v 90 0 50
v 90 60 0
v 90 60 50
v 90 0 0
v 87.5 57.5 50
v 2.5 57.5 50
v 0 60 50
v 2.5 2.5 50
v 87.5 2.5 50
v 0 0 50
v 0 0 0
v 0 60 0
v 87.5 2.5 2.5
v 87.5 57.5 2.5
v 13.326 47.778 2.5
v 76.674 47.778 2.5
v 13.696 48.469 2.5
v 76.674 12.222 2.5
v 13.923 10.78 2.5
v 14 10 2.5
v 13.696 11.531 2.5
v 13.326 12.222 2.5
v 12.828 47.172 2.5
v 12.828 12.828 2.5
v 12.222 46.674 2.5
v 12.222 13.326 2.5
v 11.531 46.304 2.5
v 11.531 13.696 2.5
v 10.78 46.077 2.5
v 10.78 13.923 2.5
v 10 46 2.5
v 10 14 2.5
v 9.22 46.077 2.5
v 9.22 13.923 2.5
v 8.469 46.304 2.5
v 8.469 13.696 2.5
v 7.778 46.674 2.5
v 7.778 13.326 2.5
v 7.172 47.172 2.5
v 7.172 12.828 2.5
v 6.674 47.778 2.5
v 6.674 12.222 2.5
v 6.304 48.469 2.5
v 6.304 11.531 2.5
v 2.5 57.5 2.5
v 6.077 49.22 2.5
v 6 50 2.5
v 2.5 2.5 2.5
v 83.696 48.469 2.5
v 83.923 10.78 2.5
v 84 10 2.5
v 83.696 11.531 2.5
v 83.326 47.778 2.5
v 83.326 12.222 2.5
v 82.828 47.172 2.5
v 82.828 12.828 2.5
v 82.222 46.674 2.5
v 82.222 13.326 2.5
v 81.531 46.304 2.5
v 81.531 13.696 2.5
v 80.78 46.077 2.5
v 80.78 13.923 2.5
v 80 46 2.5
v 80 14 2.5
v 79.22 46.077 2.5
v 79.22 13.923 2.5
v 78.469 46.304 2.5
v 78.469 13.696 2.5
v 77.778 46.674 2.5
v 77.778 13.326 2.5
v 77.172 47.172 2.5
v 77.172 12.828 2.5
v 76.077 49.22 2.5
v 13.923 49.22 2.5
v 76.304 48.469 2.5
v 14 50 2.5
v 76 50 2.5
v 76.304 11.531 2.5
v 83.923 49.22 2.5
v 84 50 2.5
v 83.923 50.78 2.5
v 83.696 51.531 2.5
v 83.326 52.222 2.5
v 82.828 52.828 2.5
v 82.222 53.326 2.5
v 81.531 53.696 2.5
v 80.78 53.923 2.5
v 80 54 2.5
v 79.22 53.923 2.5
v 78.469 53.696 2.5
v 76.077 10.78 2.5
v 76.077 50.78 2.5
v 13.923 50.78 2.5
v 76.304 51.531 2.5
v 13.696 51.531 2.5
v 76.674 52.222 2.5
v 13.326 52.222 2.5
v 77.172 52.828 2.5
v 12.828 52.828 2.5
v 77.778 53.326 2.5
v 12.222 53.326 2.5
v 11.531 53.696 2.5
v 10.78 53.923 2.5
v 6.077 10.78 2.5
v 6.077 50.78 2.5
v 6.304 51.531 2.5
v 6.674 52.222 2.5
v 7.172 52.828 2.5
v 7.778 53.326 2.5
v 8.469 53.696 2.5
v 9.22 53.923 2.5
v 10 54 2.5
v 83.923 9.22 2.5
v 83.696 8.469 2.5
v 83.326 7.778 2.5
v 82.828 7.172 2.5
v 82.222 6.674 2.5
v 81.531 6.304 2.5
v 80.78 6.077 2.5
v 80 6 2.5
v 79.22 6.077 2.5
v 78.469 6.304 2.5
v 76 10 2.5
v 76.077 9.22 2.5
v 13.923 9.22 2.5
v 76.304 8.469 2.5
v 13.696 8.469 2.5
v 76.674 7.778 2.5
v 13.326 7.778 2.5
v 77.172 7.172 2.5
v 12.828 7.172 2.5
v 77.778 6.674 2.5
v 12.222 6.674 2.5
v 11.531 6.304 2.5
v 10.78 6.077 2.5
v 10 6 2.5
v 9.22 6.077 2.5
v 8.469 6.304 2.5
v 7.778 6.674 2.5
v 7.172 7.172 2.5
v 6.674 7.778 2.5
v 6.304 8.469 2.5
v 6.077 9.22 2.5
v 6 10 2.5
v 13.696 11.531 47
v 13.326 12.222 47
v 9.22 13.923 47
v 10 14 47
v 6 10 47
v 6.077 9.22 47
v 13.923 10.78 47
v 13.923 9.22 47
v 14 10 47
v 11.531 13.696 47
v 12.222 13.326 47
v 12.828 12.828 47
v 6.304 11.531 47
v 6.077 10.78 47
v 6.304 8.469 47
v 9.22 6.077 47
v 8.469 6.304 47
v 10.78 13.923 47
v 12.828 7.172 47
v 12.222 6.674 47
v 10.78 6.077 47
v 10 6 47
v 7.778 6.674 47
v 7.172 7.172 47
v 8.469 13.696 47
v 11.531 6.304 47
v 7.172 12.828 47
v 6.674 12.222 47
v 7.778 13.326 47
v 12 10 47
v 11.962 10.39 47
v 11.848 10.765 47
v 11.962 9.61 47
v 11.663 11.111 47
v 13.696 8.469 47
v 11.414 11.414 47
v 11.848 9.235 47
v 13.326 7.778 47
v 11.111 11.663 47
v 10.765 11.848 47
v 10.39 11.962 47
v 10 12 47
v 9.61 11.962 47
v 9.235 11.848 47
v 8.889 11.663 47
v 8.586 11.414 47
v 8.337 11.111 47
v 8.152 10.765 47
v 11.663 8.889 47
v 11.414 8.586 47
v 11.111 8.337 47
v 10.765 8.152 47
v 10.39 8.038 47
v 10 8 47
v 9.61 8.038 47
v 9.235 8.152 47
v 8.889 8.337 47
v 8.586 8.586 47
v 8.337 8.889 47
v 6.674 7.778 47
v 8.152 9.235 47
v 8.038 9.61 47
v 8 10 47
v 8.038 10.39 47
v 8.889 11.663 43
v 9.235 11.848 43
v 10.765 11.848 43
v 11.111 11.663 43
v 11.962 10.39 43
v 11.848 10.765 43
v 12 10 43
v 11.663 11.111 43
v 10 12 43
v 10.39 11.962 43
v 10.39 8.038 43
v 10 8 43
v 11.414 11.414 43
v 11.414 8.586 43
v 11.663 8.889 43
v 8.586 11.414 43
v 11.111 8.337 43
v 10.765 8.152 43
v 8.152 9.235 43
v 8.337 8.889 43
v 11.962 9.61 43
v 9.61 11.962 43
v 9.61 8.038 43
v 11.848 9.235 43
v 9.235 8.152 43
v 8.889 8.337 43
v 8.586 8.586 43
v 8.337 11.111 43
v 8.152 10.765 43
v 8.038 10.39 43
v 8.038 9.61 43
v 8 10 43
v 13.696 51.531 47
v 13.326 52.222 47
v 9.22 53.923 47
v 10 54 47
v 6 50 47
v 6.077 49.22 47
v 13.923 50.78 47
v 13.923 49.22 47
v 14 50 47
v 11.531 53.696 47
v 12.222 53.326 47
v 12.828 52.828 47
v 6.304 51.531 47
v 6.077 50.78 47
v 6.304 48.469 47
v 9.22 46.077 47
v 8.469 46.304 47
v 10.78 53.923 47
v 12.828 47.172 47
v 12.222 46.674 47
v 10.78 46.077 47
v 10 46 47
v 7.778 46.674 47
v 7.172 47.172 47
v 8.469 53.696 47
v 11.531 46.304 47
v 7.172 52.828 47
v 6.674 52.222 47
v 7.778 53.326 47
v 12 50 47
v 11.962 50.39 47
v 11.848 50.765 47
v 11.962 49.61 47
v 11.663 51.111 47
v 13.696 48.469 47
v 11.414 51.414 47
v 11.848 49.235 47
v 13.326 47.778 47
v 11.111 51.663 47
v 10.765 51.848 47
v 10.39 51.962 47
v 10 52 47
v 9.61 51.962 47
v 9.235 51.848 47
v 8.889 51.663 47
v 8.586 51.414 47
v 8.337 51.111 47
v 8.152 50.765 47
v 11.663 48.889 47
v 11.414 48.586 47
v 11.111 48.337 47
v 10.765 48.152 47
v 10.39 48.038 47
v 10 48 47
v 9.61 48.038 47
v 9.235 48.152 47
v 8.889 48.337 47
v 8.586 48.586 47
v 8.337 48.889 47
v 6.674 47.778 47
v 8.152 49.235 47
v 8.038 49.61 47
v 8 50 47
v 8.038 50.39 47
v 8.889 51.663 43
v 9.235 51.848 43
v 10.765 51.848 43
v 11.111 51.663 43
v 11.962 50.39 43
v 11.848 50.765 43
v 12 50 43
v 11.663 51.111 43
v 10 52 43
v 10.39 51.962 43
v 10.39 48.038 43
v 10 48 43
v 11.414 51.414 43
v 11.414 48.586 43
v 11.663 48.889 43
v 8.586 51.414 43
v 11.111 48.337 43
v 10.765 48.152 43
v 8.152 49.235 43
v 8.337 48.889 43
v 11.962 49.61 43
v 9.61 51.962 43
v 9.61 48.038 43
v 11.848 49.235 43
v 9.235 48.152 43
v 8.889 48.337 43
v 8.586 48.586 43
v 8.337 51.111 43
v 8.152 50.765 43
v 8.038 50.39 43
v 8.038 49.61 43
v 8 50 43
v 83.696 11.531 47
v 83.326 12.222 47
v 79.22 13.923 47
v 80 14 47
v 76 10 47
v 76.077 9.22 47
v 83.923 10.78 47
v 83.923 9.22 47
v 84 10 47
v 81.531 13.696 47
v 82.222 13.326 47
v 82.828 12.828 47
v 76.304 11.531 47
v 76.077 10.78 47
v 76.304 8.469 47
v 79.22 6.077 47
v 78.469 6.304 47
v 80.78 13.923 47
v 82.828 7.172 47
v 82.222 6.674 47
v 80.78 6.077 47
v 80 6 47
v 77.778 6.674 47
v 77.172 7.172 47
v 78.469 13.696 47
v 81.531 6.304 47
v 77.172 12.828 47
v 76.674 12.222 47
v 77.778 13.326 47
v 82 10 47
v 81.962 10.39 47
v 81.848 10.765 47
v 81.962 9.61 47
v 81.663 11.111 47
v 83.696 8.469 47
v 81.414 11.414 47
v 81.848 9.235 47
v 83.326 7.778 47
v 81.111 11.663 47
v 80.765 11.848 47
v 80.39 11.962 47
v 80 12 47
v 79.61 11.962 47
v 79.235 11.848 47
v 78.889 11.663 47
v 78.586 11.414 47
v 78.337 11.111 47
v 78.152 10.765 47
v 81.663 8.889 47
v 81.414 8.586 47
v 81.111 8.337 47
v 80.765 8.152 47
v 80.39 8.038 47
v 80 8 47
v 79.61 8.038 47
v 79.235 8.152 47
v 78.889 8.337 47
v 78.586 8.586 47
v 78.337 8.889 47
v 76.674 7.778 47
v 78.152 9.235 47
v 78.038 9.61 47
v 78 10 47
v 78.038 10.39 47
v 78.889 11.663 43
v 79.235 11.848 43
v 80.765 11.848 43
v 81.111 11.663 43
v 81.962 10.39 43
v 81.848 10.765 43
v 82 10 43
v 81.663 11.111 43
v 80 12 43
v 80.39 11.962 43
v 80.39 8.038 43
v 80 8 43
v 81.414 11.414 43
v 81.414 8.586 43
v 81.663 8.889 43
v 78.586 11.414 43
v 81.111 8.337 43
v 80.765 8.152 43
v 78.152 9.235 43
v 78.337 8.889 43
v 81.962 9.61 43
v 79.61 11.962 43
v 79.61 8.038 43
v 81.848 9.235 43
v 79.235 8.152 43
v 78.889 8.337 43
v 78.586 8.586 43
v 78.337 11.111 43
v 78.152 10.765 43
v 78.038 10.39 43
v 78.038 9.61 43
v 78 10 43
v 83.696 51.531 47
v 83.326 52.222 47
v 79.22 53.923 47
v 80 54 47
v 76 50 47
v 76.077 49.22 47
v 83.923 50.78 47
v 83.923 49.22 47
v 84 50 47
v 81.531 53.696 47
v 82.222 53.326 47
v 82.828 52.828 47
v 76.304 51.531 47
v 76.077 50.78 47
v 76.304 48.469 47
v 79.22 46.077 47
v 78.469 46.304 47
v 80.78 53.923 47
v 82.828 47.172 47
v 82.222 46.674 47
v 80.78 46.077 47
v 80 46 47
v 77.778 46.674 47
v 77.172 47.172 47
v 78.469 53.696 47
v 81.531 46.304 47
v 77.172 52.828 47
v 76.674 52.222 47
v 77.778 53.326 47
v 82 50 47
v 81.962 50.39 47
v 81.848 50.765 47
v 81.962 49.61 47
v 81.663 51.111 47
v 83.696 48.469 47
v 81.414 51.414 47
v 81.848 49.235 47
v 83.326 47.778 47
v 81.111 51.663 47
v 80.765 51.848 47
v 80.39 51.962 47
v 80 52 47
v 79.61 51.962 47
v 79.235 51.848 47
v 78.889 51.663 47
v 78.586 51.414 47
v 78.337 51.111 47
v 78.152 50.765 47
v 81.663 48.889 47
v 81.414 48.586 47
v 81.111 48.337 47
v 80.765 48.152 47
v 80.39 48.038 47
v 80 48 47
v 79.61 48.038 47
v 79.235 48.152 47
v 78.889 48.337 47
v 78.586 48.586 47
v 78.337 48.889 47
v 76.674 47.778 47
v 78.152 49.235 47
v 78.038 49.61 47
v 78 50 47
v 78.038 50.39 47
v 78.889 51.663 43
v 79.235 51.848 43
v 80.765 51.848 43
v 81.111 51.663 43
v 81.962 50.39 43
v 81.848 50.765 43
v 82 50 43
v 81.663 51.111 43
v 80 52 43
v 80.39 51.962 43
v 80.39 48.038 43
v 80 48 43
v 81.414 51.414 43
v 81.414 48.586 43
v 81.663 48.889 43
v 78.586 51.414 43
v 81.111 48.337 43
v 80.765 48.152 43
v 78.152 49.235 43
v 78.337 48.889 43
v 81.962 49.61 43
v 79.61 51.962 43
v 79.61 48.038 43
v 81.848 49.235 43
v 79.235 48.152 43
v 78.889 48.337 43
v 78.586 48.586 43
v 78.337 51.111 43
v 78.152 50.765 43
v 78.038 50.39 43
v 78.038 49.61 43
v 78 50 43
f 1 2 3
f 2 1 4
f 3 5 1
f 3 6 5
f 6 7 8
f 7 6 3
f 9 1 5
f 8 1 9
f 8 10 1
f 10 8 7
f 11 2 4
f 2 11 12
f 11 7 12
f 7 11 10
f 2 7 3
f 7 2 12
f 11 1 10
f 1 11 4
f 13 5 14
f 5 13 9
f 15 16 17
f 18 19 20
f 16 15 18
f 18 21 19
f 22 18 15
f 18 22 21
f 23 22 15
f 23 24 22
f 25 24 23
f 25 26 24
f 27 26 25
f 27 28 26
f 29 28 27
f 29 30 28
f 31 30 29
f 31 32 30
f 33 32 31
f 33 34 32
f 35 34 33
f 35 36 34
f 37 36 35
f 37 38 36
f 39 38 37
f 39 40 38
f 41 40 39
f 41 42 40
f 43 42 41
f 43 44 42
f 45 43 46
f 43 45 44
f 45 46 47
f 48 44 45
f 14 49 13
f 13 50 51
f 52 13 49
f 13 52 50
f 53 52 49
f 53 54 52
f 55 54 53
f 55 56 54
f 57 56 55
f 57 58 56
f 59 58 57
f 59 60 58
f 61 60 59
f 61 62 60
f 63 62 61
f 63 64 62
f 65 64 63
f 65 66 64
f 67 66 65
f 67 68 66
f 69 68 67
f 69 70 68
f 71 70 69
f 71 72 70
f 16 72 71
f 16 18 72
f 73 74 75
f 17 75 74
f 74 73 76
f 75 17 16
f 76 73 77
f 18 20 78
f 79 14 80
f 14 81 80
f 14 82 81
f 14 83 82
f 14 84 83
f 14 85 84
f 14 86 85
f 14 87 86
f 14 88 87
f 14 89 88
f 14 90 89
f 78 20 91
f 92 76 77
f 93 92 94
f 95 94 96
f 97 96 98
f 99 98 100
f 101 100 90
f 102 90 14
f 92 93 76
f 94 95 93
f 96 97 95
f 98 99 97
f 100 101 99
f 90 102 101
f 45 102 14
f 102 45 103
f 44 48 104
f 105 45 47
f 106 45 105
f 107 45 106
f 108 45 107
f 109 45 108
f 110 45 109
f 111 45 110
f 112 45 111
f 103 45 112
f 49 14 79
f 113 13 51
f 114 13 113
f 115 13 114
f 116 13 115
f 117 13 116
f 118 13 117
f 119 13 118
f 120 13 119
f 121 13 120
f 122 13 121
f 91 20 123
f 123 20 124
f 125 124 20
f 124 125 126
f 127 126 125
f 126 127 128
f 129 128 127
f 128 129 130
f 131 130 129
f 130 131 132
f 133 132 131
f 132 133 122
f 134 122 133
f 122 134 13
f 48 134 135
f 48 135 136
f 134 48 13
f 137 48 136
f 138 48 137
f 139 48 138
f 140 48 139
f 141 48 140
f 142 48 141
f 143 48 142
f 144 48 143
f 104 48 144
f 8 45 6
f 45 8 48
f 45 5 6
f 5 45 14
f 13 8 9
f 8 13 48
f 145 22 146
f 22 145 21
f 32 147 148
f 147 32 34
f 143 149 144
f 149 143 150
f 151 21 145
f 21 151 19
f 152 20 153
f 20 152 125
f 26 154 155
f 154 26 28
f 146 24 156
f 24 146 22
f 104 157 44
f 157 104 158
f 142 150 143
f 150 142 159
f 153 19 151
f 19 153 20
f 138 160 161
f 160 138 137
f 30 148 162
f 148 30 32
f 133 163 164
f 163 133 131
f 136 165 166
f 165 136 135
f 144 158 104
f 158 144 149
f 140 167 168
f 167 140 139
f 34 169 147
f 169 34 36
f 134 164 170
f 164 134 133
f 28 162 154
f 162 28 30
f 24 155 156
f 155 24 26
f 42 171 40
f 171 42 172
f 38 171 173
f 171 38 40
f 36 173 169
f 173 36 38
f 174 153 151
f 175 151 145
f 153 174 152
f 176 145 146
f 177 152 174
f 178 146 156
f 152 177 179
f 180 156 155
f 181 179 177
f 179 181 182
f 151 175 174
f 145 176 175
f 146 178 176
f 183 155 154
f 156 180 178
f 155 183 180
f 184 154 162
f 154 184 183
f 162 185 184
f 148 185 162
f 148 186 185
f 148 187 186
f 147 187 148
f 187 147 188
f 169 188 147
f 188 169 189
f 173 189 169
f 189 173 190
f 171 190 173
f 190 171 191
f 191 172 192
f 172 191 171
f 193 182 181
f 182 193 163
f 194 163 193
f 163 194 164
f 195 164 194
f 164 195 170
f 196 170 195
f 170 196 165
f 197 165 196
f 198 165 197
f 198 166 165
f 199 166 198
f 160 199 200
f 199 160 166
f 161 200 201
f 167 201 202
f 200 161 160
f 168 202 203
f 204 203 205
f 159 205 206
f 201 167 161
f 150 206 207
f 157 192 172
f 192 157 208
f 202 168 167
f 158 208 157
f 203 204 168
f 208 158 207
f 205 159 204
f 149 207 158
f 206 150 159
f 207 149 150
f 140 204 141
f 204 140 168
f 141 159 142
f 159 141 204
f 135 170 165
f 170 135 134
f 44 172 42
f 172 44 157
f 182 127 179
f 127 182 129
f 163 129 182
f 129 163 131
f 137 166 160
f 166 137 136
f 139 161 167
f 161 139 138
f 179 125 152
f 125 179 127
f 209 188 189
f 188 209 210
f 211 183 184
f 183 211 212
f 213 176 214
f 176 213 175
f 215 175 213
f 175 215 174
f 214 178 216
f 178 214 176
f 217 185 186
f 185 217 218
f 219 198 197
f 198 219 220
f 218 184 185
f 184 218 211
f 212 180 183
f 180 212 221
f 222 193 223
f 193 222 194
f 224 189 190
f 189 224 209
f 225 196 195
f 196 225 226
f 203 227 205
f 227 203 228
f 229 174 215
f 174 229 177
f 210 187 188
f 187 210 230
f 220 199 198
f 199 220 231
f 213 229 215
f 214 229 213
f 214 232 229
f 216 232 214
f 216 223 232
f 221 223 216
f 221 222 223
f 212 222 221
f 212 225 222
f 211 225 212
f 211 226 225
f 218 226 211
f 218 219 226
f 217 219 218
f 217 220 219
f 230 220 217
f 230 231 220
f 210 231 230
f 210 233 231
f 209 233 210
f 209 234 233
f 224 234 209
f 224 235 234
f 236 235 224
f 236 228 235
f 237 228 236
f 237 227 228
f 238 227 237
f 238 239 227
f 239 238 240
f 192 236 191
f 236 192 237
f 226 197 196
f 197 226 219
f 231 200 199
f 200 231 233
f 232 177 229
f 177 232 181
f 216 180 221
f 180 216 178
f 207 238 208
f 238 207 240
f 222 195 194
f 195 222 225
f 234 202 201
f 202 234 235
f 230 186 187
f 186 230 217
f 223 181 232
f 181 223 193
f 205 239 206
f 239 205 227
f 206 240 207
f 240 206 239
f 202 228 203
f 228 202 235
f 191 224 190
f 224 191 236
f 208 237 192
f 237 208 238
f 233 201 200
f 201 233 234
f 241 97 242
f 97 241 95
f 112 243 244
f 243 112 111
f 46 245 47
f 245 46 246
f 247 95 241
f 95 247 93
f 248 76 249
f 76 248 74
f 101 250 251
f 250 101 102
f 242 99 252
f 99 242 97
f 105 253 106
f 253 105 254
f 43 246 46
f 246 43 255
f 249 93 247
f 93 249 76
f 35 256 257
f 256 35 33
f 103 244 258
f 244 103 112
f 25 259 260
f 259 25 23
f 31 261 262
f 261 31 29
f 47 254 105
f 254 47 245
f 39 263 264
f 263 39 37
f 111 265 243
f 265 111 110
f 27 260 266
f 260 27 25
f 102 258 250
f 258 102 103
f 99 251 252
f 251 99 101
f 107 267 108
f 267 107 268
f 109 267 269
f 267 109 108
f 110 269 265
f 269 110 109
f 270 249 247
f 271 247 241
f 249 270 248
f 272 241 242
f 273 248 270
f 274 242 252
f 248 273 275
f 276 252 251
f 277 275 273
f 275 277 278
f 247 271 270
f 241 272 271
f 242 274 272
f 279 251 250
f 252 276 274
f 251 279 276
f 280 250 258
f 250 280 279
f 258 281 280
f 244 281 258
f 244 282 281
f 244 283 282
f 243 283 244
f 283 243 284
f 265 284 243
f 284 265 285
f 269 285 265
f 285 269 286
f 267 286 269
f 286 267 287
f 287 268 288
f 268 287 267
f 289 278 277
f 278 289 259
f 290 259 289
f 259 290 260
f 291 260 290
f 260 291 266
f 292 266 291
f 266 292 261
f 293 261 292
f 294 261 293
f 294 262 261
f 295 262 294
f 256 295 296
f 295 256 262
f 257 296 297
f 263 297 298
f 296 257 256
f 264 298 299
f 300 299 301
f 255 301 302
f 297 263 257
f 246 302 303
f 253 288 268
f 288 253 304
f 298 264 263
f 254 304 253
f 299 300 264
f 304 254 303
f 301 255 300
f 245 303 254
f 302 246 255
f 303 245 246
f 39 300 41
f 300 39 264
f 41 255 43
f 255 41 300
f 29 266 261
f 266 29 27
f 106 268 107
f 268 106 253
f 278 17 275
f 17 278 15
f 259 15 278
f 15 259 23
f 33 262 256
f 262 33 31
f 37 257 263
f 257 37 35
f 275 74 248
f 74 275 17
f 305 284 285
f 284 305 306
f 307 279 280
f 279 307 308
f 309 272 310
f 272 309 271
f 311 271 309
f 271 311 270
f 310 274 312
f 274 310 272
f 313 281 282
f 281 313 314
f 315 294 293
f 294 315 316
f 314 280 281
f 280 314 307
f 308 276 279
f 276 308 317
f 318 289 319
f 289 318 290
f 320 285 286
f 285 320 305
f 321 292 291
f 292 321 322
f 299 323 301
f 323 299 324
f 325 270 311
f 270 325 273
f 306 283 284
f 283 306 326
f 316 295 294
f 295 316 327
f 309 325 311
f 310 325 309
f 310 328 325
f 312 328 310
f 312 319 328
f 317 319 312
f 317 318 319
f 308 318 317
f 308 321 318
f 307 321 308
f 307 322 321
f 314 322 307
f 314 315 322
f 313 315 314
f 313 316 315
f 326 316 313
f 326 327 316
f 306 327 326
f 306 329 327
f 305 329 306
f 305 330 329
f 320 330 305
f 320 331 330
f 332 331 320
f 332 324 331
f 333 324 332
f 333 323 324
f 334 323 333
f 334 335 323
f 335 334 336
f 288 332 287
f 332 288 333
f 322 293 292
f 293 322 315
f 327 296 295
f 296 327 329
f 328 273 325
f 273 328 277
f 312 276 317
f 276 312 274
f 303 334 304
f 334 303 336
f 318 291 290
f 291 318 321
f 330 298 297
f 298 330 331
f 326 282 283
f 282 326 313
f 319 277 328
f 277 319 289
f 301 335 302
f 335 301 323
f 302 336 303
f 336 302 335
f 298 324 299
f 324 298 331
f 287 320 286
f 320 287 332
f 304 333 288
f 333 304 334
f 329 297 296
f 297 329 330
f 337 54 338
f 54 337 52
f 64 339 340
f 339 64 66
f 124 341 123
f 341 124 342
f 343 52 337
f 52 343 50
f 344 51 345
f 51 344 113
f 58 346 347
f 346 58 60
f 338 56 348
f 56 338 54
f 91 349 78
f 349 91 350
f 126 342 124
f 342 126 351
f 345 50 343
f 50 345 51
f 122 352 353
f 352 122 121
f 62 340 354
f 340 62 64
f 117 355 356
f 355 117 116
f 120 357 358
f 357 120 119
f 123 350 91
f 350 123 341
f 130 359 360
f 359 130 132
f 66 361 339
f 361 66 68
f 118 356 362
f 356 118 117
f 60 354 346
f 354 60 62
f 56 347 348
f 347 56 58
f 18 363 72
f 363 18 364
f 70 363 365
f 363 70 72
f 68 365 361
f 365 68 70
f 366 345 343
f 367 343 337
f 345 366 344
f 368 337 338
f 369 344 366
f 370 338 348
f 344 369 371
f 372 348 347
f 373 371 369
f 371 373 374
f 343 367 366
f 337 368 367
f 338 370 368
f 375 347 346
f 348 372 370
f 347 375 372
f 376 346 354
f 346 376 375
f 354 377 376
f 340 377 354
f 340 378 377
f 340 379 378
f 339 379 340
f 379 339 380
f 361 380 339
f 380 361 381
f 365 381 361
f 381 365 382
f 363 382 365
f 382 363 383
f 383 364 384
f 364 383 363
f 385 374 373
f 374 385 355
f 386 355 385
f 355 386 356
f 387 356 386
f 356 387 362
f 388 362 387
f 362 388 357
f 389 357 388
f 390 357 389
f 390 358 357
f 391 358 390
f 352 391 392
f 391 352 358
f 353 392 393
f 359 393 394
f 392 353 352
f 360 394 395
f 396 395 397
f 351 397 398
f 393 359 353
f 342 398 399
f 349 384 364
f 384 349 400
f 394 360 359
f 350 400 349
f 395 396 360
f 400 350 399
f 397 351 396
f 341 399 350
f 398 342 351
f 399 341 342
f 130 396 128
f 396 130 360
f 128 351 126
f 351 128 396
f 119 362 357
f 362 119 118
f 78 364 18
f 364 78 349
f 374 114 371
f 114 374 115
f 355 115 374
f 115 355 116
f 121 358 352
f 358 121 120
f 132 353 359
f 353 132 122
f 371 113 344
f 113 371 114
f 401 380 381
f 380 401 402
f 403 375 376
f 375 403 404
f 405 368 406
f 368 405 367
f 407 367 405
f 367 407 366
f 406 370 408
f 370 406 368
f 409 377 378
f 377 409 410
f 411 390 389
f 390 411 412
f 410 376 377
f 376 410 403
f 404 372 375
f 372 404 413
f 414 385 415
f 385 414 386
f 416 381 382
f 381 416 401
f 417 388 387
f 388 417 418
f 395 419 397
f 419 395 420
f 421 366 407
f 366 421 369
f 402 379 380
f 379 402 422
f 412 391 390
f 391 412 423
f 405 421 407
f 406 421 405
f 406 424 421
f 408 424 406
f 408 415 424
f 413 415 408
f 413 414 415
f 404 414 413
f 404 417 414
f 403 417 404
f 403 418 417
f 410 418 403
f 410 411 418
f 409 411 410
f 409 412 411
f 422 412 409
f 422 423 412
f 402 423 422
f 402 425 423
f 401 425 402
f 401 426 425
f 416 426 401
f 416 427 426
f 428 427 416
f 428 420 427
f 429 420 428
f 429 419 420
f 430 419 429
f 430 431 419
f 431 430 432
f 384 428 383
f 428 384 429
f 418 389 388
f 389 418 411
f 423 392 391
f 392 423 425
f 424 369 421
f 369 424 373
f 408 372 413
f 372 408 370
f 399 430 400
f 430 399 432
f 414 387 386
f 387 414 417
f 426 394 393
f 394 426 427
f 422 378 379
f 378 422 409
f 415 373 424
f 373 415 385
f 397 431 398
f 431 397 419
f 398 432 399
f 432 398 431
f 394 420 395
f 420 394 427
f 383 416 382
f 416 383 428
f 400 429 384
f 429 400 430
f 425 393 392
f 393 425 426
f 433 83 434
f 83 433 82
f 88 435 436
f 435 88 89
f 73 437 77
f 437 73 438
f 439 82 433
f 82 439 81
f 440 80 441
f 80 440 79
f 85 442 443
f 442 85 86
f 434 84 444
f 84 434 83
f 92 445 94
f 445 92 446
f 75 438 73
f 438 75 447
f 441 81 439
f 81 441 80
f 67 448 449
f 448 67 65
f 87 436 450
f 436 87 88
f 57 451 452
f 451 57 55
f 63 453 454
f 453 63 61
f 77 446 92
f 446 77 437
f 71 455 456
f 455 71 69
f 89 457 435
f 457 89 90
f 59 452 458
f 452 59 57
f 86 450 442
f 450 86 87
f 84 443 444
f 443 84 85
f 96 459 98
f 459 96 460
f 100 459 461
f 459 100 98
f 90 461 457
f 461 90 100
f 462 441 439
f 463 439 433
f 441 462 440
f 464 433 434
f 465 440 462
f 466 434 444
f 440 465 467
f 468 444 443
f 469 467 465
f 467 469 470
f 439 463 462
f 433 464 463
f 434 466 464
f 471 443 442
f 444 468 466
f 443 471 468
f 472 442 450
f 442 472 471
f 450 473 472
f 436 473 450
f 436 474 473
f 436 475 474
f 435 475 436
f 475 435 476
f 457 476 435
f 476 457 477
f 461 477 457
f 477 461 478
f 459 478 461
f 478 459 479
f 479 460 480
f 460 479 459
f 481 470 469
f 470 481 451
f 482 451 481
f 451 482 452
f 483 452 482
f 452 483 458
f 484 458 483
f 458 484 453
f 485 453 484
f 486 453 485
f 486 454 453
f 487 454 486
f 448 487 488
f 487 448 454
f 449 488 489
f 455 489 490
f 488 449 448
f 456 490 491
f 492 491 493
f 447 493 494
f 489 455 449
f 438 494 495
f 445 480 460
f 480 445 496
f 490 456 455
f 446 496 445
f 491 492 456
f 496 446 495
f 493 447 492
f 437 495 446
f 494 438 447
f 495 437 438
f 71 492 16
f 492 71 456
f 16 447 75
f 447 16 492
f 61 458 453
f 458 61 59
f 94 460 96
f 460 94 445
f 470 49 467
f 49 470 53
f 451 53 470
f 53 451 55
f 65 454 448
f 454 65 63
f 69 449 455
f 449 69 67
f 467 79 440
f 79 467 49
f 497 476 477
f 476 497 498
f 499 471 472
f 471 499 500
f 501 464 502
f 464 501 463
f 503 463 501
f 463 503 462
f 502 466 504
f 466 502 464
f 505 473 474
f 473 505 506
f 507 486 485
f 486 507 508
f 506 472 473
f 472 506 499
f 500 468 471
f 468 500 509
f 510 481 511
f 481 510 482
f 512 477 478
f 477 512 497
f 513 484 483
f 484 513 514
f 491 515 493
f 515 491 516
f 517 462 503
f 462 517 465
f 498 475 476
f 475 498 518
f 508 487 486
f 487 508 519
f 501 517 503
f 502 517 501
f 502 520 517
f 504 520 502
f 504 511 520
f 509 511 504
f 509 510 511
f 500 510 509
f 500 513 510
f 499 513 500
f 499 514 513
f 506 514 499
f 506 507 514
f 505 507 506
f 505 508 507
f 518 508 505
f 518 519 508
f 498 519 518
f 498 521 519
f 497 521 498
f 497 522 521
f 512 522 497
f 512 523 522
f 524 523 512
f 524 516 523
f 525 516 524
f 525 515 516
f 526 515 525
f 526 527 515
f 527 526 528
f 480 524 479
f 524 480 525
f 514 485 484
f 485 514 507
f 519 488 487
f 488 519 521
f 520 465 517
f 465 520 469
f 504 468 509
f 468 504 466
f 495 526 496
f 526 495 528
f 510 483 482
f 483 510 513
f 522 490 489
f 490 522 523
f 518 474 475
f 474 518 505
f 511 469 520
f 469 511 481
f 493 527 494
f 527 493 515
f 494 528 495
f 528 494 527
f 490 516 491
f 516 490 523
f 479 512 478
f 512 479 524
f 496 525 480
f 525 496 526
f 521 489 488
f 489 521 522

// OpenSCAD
$fn = 32;

// ----------------------------------------------------------------------
// Enclosure box: bosses enclosure
// ----------------------------------------------------------------------

// --- parameters (mm) ---
box_l = 90;               // outer length, X
box_w = 60;               // outer width, Y
box_h = 50;               // outer height
wall_t = 2.5;             // wall thickness
boss_r = 4;               // corner boss radius
hole_r = 2;               // boss screw hole radius
boss_in = 10;             // boss inset from the corners

inner_h = box_h - wall_t;  // cavity depth
boss_h = inner_h - 2;  // corner boss height

difference() {
  union() {
    difference() {
      cube([box_l, box_w, box_h]);
      translate([wall_t, wall_t, wall_t])
        cube([box_l - 2 * wall_t, box_w - 2 * wall_t, box_h]);
    }
    for (sx = [0, 1], sy = [0, 1])
      translate([sx ? box_l - boss_in : boss_in,
                 sy ? box_w - boss_in : boss_in, wall_t - 1])
        difference() {
          cylinder(r = boss_r, h = boss_h);
          translate([0, 0, boss_h - 4])
            cylinder(r = hole_r, h = 5);
        }
  }
}
